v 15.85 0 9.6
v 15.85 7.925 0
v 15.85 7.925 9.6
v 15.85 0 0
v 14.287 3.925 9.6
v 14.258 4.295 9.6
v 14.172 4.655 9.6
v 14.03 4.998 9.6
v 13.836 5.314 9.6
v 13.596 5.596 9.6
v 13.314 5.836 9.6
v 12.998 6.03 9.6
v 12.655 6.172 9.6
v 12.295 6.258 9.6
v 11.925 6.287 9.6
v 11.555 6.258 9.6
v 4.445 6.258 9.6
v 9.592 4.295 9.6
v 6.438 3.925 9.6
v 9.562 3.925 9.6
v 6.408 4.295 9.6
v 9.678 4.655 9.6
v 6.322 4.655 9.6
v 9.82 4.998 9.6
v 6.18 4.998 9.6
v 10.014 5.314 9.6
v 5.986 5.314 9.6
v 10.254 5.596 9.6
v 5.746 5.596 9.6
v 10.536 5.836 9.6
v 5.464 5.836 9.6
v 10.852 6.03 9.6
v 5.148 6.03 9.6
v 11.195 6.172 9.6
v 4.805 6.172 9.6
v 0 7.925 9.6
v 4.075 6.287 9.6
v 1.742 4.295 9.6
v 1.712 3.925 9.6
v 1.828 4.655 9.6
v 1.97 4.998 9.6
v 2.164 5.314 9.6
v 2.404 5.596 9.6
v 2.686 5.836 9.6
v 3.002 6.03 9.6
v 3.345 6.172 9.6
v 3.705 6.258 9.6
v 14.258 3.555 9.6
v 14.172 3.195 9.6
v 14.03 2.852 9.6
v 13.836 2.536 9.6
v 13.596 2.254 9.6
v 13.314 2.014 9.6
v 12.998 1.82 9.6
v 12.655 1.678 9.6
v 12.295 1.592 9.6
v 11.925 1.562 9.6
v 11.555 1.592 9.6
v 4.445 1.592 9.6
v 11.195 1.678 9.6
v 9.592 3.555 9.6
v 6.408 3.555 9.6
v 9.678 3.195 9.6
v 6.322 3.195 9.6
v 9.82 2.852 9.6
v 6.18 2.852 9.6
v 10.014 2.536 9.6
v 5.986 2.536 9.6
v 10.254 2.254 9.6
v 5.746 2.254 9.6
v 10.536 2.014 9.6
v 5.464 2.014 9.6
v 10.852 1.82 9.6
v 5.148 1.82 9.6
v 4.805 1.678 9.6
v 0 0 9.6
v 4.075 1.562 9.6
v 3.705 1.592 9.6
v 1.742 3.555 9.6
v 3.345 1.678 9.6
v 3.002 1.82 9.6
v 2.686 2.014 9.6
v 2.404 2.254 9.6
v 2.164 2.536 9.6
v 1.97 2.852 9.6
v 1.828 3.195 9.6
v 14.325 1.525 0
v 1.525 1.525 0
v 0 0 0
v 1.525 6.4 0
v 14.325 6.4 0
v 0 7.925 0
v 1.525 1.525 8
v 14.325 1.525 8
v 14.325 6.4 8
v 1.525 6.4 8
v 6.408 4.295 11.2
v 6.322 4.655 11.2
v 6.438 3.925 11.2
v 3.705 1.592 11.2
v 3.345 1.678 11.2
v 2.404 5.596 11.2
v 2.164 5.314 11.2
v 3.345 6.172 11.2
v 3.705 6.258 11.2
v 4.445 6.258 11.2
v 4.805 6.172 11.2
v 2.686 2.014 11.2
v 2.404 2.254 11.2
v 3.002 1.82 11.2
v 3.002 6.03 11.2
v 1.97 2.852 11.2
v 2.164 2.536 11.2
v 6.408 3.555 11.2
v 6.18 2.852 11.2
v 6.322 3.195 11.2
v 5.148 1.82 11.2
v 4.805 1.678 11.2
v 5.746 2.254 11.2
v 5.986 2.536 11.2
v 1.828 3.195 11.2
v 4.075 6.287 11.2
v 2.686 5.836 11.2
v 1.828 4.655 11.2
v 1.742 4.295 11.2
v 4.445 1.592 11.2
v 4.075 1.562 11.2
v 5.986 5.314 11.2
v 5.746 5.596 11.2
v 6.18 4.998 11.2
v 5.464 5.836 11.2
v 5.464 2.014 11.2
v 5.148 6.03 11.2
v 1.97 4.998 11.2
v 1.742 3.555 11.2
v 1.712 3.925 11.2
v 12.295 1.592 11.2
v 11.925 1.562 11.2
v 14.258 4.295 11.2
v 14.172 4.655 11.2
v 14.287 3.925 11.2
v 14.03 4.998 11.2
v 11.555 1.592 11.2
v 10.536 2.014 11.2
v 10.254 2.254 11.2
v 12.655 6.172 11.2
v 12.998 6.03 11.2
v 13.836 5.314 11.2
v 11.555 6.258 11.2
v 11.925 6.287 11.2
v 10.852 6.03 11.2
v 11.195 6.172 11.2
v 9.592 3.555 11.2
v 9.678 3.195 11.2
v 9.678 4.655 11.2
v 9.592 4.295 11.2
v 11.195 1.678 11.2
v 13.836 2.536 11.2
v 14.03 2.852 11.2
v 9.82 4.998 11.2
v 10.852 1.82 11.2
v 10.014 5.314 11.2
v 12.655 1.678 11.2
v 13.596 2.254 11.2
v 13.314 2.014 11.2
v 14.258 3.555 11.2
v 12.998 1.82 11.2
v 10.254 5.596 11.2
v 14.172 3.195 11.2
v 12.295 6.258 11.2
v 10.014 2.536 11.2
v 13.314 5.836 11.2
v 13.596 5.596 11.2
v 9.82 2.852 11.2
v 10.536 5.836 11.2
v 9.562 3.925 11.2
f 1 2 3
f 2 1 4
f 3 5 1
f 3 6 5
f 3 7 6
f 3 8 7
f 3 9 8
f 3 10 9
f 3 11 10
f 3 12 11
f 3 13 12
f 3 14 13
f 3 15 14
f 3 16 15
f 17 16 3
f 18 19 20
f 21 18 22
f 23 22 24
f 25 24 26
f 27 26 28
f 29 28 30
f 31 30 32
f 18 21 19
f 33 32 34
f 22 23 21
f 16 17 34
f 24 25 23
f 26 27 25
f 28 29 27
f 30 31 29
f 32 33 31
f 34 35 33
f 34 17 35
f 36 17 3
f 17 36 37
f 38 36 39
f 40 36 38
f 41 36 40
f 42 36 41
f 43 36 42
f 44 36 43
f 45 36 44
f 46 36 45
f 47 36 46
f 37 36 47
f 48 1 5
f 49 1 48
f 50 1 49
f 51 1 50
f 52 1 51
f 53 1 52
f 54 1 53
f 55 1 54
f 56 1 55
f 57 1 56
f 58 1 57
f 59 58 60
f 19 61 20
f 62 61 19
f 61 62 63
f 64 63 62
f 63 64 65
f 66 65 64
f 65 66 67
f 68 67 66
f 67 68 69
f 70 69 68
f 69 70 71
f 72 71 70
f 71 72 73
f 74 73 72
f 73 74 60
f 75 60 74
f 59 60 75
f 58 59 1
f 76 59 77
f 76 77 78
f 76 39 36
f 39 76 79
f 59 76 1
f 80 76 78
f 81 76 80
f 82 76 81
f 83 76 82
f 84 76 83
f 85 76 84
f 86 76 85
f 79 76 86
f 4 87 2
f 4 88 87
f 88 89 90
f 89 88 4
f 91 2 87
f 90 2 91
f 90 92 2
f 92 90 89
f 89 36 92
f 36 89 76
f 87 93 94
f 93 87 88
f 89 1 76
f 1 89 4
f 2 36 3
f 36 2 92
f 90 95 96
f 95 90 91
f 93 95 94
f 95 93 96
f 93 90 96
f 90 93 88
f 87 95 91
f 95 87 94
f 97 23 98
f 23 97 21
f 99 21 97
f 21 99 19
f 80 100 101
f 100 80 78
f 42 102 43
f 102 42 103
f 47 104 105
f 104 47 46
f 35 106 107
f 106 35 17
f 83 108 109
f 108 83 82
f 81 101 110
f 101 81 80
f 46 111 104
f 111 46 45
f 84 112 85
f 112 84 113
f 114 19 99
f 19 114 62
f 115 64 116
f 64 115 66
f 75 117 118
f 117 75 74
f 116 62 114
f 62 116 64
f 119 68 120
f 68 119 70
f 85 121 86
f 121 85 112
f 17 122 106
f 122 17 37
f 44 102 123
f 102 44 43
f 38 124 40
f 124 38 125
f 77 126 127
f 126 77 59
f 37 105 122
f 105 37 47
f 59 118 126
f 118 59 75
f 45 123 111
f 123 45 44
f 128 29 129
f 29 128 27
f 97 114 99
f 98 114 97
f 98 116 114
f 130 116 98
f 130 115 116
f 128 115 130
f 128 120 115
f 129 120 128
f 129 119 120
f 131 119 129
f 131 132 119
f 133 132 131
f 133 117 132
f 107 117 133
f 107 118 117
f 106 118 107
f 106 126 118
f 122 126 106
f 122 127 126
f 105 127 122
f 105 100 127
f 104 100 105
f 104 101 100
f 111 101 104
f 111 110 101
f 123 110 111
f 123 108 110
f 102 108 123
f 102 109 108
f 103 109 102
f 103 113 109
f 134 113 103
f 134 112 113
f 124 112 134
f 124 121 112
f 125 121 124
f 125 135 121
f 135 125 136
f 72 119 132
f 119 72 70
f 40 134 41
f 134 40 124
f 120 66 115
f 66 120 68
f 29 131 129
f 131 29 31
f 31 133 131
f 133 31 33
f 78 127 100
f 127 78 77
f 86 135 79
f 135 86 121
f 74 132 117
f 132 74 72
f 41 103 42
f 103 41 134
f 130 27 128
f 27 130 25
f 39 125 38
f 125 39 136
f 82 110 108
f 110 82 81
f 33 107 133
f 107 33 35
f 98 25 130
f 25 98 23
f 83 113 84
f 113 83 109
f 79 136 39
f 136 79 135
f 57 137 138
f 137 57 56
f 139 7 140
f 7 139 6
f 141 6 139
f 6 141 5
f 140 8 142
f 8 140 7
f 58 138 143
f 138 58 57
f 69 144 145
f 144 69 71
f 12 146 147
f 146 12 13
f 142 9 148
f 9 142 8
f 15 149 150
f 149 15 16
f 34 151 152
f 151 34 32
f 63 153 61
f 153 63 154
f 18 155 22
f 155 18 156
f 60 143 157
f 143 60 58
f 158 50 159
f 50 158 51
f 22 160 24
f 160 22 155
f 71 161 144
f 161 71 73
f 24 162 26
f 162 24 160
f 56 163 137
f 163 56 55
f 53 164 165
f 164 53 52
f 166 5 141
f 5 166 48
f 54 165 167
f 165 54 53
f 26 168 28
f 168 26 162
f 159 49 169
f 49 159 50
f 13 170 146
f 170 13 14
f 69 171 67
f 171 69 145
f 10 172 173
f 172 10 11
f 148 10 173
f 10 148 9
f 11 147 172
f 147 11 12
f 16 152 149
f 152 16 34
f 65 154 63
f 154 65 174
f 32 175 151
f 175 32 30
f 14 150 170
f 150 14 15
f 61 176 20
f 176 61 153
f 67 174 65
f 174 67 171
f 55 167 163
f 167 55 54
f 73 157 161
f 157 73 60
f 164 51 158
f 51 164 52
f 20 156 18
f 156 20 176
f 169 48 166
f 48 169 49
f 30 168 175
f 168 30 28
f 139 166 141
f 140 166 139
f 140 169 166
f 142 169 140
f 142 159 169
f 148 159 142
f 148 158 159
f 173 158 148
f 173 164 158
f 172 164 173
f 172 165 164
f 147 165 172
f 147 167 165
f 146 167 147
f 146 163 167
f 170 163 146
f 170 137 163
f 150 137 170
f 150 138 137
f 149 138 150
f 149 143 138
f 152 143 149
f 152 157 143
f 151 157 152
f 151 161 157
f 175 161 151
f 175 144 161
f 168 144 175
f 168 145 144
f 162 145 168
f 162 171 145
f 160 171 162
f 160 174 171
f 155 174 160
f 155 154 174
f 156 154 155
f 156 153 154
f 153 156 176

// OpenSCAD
//Spacing factor between pieces
gap_factor = .15; //.05 to .2


/* No need to modify anything else */

/* [Hidden] */

lego_unit = 1.6;

brick_height=6 * lego_unit;
unit_span = (5 * lego_unit);



//wide edges
cube([(2*unit_span)-gap_factor,lego_unit-(gap_factor/2),brick_height],0);

translate([0,(4*lego_unit),0])
{
    cube([(2*unit_span)-gap_factor, lego_unit-(gap_factor/2),brick_height],0);
};

//top
translate([0,unit_span-gap_factor, brick_height-lego_unit])
{
    rotate([90,0,0])
    {
          cube([(2*unit_span)-gap_factor, lego_unit,unit_span- gap_factor],0);  
    }
};
//short edges
translate([lego_unit-(gap_factor/2), 0, 0])
{
    rotate([0,0,90])
    {
        cube([unit_span-gap_factor, lego_unit-(gap_factor/2),brick_height],0);
    }
};


translate([unit_span*2 - gap_factor,0,0])
{
    rotate([0,0,90])
    {
        cube([unit_span-gap_factor, lego_unit-(gap_factor/2),brick_height],0);
    }
}

//studs
stud_dia = (lego_unit*1.5) - (gap_factor/4);
translate([(unit_span/2)+(gap_factor/2),(unit_span-gap_factor)/2,brick_height])
{
    cylinder(lego_unit,stud_dia, stud_dia, $fn=40);
};

translate([unit_span*1.5 - (gap_factor/2),(unit_span-gap_factor)/2,brick_height])
{
    cylinder(lego_unit,stud_dia, stud_dia, $fn=40);
};
